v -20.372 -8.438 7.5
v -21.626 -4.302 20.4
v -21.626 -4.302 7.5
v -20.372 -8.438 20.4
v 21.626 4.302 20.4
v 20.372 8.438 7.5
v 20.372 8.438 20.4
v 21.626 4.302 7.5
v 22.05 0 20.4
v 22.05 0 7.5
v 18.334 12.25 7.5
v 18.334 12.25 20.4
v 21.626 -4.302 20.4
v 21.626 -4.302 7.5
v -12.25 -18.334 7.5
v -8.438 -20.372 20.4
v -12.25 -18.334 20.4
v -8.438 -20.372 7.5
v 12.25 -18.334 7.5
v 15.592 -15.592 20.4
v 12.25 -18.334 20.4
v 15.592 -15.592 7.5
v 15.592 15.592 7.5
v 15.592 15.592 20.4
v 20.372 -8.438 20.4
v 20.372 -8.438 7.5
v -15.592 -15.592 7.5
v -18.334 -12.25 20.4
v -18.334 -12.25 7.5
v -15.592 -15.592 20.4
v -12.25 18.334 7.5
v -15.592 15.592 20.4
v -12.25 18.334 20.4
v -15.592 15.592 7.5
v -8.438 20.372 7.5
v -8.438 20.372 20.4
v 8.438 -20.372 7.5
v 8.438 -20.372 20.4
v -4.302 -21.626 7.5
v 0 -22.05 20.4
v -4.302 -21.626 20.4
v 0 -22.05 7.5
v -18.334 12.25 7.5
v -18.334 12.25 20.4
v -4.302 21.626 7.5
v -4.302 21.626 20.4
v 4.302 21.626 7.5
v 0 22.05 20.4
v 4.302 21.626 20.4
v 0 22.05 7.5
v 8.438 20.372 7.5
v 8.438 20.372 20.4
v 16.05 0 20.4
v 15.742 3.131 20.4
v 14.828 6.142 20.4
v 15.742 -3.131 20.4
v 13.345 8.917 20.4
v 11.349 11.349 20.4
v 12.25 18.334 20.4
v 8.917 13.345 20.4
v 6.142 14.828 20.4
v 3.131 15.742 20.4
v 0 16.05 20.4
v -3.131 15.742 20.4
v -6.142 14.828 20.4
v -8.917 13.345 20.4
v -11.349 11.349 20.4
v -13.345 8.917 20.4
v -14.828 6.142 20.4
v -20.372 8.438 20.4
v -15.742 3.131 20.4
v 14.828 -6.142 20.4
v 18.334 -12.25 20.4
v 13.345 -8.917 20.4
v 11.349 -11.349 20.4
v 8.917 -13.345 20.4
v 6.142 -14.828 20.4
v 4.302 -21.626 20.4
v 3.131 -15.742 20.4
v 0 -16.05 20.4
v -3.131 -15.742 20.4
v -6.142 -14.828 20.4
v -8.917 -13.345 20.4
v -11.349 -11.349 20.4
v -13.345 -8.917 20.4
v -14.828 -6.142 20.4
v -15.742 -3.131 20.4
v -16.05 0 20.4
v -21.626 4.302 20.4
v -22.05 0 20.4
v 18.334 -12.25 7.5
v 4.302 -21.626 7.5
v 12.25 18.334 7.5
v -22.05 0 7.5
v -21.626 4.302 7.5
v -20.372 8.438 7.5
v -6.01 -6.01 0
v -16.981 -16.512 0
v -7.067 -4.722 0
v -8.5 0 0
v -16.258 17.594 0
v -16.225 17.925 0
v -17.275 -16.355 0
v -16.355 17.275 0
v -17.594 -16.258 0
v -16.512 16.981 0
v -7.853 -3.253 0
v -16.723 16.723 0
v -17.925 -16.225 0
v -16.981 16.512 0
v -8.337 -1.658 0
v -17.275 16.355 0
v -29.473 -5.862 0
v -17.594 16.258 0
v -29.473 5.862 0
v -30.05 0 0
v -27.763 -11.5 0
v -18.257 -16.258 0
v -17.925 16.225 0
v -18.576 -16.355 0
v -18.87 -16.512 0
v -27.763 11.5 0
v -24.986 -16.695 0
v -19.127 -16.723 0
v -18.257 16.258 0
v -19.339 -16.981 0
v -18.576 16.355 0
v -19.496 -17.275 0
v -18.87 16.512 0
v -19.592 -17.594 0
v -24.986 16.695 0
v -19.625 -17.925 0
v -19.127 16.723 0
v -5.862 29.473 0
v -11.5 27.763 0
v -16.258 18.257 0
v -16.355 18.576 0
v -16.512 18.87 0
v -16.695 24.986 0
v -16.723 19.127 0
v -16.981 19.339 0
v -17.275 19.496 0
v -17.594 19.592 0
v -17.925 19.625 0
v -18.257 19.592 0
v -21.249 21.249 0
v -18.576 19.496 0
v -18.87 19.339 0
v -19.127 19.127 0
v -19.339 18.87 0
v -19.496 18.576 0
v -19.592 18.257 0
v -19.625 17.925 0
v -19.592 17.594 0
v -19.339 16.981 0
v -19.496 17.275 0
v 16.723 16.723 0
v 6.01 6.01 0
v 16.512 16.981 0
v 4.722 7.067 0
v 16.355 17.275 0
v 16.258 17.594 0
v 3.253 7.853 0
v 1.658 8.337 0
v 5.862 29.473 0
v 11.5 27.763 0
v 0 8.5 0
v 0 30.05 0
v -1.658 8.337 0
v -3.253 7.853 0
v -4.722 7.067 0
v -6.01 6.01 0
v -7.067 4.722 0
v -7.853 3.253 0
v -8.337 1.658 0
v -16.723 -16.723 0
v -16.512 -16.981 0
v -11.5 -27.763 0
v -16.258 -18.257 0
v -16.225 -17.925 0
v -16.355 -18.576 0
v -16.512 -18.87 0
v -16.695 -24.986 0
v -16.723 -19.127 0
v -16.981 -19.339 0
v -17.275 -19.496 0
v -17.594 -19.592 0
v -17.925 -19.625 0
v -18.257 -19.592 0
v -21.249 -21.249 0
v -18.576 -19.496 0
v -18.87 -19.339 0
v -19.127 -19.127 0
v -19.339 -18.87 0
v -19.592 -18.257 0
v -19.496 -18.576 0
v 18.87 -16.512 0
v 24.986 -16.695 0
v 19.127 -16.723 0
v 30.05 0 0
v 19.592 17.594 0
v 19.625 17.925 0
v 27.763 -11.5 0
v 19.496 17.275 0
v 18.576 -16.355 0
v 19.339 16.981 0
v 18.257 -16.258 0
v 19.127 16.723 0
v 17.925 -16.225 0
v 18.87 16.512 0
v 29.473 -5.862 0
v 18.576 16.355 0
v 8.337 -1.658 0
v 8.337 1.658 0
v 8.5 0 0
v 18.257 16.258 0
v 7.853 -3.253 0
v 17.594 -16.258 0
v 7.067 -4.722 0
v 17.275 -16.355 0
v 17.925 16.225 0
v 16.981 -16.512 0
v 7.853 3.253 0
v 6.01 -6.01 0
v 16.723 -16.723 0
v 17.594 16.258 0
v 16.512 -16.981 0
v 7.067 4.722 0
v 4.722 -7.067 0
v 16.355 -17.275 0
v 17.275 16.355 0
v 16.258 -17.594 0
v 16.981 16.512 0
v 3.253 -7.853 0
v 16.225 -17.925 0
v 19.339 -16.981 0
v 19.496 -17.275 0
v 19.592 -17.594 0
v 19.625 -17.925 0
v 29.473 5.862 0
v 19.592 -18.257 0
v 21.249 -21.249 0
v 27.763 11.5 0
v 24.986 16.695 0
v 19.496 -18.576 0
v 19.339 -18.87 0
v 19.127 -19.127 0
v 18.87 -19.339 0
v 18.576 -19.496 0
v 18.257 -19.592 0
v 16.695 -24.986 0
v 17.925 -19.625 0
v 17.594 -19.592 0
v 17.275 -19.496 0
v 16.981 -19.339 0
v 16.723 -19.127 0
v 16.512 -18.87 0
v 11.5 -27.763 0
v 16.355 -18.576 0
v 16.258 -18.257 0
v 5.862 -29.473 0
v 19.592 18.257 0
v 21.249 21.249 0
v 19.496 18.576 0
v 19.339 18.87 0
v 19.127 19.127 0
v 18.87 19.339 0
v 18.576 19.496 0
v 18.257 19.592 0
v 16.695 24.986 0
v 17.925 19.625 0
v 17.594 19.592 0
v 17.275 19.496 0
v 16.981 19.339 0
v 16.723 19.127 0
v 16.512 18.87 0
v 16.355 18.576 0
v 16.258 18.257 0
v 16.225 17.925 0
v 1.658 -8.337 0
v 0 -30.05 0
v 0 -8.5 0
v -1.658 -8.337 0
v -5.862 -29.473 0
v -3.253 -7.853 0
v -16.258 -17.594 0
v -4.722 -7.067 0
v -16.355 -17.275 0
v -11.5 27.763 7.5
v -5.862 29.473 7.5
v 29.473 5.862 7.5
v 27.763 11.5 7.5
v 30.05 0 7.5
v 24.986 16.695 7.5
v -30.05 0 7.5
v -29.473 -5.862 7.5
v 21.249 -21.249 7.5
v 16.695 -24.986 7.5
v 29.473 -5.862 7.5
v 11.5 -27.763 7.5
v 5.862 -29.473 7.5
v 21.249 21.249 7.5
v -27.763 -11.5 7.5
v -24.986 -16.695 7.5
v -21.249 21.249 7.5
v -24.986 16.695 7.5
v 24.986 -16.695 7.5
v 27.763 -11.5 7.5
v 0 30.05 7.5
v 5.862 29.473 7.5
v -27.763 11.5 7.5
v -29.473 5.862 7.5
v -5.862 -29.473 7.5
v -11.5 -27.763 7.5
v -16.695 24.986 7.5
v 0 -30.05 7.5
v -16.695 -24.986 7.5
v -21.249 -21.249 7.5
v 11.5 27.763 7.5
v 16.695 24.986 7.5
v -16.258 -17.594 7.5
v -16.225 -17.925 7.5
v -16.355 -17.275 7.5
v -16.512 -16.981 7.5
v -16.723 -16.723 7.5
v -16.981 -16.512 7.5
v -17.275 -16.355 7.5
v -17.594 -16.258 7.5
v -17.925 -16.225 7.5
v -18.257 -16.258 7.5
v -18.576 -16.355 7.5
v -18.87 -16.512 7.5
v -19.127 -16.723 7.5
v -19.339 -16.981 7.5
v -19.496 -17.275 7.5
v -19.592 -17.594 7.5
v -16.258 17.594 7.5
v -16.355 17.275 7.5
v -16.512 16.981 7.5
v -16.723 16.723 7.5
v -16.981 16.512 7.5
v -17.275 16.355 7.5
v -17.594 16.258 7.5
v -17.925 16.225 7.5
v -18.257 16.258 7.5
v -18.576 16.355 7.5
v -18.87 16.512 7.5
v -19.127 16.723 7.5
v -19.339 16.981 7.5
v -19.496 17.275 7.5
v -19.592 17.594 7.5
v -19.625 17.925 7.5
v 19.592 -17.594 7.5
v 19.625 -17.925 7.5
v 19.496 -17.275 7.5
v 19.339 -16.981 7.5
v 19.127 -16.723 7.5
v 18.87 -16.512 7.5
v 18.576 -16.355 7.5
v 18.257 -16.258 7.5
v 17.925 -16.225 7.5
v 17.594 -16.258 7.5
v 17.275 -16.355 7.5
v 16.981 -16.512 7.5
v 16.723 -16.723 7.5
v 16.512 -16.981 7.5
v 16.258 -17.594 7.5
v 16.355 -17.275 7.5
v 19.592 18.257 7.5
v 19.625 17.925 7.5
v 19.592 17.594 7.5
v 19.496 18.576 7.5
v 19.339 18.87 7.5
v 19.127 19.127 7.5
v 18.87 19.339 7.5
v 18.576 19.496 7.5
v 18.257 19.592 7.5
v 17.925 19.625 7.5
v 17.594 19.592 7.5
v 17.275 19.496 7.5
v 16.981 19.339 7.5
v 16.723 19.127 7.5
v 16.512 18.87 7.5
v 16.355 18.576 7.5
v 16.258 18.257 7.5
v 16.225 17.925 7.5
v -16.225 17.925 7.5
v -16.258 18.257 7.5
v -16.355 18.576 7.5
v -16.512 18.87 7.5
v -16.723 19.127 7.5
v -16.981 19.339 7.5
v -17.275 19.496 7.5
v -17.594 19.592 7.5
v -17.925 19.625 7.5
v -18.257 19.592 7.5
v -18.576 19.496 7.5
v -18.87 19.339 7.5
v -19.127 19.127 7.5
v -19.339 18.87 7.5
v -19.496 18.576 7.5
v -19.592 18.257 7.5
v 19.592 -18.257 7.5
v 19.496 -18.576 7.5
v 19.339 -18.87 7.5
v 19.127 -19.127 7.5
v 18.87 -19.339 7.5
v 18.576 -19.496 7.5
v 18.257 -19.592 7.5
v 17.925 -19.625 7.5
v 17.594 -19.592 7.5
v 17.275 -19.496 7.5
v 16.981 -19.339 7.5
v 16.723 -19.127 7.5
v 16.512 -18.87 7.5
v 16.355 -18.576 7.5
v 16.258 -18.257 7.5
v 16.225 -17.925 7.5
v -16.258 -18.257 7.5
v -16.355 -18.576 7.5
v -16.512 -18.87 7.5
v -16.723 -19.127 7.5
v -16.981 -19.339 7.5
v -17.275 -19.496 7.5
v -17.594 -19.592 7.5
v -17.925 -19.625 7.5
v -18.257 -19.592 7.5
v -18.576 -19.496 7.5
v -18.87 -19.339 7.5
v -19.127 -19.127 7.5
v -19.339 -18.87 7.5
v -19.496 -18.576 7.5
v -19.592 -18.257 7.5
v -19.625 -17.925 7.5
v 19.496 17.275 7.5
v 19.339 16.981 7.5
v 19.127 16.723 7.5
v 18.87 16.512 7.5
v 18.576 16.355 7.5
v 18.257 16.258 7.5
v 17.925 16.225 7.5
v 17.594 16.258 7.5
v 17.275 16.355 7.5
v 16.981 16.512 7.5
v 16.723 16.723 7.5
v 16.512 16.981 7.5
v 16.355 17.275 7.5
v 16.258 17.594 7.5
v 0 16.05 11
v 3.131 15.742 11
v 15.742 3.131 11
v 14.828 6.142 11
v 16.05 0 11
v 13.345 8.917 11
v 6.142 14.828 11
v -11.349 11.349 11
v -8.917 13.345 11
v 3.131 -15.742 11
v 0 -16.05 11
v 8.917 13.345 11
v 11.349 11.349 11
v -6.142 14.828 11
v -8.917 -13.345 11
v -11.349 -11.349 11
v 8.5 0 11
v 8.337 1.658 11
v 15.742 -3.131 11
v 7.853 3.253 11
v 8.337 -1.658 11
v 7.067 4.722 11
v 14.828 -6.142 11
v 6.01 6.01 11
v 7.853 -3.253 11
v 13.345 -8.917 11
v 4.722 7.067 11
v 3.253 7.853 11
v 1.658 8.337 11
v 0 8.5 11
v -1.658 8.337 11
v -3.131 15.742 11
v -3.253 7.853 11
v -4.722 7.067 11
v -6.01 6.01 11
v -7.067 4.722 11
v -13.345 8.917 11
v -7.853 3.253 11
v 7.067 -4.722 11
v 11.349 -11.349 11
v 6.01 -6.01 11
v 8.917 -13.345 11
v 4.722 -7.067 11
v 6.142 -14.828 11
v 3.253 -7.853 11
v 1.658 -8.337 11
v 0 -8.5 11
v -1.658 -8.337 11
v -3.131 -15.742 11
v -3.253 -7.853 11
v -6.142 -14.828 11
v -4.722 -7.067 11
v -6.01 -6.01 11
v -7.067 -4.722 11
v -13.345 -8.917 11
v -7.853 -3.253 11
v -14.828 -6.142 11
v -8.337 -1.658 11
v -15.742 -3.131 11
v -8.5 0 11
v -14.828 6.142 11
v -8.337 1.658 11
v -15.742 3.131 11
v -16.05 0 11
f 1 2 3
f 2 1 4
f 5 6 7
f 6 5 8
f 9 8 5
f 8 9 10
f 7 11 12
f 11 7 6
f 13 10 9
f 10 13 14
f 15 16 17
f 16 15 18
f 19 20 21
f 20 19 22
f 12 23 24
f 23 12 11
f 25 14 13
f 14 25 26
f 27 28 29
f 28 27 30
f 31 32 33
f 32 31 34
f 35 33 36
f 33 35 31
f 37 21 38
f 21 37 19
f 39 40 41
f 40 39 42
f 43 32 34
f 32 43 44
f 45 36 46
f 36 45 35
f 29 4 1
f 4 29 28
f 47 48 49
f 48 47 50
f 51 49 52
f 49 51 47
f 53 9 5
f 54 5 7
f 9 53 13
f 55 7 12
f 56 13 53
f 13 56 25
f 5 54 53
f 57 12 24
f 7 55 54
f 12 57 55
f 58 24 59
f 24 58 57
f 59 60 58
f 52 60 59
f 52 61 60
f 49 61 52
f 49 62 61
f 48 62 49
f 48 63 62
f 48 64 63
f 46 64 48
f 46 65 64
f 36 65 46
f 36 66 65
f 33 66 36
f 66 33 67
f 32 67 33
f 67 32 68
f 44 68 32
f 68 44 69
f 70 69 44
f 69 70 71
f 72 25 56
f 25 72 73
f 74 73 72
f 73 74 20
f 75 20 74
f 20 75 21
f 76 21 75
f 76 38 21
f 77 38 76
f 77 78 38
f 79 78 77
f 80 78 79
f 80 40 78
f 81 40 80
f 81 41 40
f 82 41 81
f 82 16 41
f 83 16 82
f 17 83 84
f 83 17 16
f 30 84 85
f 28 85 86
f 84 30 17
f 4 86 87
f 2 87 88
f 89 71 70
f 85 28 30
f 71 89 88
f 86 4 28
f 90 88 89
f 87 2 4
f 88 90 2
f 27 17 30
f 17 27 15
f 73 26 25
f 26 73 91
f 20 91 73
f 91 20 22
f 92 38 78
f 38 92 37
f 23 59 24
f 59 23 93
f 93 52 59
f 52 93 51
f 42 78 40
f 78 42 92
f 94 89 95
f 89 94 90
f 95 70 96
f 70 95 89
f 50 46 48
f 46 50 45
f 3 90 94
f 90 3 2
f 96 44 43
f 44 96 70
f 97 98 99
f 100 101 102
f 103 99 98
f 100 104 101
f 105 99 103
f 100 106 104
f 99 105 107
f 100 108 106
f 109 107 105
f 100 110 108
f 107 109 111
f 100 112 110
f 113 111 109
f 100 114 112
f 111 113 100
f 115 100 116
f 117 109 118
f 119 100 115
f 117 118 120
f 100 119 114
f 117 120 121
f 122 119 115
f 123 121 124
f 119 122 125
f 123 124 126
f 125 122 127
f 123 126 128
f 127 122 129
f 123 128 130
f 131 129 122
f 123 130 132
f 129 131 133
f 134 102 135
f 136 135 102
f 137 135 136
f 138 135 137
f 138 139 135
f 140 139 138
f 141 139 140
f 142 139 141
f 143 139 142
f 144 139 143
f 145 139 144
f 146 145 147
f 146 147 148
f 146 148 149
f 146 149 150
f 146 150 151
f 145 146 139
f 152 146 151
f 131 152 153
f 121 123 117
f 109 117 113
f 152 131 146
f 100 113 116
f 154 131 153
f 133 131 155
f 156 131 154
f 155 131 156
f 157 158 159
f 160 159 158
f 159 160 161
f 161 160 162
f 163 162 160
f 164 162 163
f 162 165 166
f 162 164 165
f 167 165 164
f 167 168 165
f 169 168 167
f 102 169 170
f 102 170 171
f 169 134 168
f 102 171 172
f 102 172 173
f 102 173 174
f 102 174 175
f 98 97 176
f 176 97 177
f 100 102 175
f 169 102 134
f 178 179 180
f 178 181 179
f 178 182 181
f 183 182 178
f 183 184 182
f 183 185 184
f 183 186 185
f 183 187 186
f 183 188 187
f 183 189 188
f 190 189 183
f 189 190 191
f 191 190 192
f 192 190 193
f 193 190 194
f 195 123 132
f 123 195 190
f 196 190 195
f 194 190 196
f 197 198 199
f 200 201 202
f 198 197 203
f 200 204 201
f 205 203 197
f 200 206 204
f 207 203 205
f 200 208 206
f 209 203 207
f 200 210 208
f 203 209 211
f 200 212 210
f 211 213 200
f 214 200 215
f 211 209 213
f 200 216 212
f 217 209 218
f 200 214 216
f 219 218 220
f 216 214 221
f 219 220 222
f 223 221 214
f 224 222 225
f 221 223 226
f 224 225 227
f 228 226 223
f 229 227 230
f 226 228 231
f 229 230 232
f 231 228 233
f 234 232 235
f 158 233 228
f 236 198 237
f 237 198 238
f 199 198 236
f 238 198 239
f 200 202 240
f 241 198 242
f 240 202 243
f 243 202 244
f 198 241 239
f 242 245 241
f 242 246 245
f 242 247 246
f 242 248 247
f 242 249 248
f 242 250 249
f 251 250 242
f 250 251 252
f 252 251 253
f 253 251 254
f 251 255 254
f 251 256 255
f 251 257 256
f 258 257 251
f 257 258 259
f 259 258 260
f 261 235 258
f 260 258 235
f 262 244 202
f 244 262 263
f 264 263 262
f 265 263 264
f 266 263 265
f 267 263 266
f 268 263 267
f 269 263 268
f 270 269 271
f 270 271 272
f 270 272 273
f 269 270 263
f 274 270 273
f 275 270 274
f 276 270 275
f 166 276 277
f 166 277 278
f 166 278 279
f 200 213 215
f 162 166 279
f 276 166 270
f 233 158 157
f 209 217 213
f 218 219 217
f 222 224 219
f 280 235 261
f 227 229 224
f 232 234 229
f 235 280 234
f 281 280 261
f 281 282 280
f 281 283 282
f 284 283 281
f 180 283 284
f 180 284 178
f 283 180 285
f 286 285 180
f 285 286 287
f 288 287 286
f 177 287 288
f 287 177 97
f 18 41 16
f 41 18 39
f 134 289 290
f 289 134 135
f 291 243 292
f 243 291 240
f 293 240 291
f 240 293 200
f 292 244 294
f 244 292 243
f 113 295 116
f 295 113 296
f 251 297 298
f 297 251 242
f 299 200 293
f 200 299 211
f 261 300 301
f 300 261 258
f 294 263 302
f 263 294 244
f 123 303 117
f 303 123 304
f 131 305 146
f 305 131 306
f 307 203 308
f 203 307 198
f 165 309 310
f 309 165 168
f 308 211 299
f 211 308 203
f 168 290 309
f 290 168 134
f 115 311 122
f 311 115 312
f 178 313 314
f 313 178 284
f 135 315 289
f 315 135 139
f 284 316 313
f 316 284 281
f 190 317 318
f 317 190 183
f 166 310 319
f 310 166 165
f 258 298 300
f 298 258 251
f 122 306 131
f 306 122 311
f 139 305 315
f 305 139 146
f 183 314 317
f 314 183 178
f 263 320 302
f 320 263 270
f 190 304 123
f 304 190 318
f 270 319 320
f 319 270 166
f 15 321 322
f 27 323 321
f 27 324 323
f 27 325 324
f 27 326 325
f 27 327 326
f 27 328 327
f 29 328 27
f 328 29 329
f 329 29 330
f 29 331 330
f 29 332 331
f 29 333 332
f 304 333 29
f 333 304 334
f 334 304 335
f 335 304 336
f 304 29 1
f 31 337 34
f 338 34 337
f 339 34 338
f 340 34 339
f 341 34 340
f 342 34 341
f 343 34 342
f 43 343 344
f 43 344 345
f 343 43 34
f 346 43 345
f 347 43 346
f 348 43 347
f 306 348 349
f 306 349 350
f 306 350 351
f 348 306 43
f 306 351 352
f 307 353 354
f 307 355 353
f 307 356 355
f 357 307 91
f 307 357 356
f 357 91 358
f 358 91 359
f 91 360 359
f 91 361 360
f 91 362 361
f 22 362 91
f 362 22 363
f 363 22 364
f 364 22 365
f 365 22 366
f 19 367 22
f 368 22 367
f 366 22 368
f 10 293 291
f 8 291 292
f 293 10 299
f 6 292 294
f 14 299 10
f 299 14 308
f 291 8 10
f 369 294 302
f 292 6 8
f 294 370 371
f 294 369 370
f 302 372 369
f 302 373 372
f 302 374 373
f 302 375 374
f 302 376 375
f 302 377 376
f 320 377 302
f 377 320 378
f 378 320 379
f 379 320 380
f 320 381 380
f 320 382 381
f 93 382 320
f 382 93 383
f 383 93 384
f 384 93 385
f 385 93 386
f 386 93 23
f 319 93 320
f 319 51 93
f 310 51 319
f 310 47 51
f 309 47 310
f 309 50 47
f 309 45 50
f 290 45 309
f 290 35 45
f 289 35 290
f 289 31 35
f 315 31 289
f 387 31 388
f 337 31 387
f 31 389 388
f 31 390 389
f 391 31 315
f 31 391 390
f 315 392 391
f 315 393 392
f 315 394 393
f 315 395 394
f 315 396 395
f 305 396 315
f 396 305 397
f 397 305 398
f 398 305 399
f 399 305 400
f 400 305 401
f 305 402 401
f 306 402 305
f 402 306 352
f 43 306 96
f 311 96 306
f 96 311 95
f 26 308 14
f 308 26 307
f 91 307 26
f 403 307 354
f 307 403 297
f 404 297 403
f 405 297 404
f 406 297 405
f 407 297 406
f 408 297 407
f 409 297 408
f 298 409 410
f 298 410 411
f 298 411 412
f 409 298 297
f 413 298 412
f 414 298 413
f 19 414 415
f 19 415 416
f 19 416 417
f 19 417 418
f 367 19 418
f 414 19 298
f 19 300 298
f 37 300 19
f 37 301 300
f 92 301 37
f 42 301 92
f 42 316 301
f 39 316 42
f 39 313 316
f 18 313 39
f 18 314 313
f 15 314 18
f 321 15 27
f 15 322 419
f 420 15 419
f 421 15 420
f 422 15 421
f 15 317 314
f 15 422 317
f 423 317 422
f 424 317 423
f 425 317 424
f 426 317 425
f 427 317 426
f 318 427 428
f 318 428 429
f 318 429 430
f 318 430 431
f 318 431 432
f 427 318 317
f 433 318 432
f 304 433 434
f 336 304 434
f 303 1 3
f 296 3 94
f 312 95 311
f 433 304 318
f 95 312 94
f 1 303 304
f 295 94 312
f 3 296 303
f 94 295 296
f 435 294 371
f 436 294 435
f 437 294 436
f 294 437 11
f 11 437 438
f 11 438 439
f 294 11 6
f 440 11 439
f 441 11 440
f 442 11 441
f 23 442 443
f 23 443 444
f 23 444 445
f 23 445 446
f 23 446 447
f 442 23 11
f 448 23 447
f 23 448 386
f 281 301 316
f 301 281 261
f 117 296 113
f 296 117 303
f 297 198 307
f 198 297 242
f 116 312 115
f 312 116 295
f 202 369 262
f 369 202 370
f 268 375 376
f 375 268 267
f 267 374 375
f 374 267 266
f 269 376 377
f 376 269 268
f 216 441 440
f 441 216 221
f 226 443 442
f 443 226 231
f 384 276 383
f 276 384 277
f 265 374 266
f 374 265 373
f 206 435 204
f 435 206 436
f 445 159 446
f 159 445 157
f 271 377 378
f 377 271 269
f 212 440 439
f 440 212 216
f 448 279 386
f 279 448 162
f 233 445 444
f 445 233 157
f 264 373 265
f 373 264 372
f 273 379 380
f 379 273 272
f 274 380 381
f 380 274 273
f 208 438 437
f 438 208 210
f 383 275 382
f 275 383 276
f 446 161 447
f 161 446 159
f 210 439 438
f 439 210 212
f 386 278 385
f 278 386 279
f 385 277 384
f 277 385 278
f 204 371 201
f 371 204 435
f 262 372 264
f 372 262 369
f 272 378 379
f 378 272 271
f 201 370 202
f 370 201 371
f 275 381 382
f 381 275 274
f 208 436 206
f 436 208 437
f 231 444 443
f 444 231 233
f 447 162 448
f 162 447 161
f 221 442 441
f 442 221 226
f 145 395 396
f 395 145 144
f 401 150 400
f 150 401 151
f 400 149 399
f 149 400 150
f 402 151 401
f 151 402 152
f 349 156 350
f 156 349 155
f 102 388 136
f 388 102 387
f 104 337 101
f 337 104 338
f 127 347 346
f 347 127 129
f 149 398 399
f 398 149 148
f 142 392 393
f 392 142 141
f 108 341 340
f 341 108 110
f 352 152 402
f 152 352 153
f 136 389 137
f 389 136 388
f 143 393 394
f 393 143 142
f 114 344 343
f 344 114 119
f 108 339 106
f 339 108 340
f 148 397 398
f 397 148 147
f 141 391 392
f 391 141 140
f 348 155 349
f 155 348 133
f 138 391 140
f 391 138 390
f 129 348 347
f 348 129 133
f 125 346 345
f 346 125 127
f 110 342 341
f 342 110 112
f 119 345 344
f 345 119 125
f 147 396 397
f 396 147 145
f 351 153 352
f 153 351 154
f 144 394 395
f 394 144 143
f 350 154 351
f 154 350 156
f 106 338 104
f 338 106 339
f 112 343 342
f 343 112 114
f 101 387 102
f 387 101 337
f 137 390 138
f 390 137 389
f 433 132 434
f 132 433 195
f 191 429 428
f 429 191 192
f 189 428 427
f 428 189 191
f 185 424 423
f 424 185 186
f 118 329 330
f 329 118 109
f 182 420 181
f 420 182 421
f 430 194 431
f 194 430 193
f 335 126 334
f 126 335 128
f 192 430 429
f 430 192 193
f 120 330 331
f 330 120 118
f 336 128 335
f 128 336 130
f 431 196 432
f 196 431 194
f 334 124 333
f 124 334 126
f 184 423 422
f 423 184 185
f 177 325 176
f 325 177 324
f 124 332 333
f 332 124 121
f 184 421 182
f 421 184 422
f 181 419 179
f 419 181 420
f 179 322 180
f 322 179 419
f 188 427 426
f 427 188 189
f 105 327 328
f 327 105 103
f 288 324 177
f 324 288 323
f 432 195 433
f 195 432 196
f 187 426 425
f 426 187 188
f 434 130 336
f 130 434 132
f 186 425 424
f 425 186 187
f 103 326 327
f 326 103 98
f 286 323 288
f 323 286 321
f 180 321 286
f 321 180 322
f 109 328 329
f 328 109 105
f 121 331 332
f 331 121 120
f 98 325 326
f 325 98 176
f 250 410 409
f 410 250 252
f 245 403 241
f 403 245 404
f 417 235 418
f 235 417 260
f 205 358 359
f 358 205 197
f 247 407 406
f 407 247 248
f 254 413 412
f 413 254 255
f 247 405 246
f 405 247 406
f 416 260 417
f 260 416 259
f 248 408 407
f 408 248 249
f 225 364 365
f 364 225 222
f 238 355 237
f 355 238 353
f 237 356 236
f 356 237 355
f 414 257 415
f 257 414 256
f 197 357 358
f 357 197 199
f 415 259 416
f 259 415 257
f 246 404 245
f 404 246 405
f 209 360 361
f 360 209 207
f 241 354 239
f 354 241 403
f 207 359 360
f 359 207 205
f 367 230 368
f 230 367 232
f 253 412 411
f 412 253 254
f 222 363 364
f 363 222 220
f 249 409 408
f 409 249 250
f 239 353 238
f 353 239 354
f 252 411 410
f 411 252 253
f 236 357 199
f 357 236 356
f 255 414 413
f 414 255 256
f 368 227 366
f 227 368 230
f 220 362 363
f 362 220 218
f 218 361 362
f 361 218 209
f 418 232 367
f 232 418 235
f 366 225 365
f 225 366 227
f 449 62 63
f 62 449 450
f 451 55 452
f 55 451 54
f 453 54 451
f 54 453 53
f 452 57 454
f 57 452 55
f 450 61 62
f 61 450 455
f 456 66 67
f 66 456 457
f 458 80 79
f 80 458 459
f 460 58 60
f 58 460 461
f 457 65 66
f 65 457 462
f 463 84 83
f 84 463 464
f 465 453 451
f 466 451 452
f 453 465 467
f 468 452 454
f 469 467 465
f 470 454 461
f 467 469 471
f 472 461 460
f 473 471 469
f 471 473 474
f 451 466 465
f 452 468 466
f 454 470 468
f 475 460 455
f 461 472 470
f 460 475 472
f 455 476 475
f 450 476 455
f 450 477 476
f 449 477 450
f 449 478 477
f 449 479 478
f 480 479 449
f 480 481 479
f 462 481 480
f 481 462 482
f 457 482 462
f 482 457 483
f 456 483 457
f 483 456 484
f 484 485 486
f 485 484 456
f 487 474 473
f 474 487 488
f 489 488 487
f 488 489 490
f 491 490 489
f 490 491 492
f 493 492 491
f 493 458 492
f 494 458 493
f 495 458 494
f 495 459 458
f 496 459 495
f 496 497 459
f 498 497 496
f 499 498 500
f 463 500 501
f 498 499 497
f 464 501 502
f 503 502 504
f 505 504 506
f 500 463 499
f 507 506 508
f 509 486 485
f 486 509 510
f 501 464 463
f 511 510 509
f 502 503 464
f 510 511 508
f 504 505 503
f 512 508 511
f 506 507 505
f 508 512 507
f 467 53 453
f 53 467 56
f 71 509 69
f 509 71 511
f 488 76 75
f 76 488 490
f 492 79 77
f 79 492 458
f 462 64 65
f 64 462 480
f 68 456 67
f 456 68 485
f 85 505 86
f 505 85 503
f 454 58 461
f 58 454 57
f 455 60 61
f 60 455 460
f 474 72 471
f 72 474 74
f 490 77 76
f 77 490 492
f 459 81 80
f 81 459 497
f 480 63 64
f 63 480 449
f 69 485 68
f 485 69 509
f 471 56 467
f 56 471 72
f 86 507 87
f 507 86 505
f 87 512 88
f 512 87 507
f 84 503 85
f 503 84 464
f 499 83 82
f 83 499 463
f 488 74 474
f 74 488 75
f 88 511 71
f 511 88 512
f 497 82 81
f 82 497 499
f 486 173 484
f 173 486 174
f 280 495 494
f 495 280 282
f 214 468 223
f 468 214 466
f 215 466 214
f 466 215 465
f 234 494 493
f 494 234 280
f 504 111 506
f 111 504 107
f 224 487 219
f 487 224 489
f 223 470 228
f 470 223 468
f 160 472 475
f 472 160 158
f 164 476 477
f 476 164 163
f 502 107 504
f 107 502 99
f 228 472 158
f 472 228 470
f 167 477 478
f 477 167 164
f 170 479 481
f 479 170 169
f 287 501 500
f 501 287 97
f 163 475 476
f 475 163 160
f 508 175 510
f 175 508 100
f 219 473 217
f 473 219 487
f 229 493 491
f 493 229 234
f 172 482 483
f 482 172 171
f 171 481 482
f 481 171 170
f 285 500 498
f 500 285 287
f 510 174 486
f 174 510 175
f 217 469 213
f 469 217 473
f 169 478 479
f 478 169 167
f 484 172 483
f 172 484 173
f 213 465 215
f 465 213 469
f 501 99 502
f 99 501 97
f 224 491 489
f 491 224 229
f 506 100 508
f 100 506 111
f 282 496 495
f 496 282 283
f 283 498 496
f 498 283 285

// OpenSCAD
$fn = 32;

// ----------------------------------------------------------------------
// Bearing housing: seat for 6002 (32 x 9 mm), 44.1 mm body
// ----------------------------------------------------------------------

// --- parameters (mm) ---
housing_d = 44.1;         // housing outside diameter
housing_h = 20.4;         // overall housing height
wall_t = 6;               // wall thickness
seat_d = 32.1;            // 6002 seat, 0.1 mm clearance
seat_h = 9.4;             // pocket depth
shoulder = 5;             // shoulder under the bearing
pass_d = 17;              // shaft passage
flange_d = 60.1;          // mounting flange diameter
flange_t = 6;             // flange thickness
bolt_d = 3.4;             // flange bolt clearance
bolt_r = 25.35;           // flange bolt circle radius

module body() {
  cylinder(h = housing_h, d = housing_d);
}

module flange() {
  /* flange sunk 1.5 mm into the body */
  cylinder(h = flange_t + 1.5, d = flange_d);
}

difference() {
  union() {
    body();
    flange();
  }
  translate([0, 0, housing_h - seat_h]) cylinder(h = seat_h + 1, d = seat_d);
  translate([0, 0, -1]) cylinder(h = housing_h - seat_h + 1, d = pass_d);
  for (i = [0 : 3]) rotate([0, 0, 45 + i * 90]) translate([bolt_r, 0, -1])
    cylinder(h = flange_t + 3, d = bolt_d);
}
